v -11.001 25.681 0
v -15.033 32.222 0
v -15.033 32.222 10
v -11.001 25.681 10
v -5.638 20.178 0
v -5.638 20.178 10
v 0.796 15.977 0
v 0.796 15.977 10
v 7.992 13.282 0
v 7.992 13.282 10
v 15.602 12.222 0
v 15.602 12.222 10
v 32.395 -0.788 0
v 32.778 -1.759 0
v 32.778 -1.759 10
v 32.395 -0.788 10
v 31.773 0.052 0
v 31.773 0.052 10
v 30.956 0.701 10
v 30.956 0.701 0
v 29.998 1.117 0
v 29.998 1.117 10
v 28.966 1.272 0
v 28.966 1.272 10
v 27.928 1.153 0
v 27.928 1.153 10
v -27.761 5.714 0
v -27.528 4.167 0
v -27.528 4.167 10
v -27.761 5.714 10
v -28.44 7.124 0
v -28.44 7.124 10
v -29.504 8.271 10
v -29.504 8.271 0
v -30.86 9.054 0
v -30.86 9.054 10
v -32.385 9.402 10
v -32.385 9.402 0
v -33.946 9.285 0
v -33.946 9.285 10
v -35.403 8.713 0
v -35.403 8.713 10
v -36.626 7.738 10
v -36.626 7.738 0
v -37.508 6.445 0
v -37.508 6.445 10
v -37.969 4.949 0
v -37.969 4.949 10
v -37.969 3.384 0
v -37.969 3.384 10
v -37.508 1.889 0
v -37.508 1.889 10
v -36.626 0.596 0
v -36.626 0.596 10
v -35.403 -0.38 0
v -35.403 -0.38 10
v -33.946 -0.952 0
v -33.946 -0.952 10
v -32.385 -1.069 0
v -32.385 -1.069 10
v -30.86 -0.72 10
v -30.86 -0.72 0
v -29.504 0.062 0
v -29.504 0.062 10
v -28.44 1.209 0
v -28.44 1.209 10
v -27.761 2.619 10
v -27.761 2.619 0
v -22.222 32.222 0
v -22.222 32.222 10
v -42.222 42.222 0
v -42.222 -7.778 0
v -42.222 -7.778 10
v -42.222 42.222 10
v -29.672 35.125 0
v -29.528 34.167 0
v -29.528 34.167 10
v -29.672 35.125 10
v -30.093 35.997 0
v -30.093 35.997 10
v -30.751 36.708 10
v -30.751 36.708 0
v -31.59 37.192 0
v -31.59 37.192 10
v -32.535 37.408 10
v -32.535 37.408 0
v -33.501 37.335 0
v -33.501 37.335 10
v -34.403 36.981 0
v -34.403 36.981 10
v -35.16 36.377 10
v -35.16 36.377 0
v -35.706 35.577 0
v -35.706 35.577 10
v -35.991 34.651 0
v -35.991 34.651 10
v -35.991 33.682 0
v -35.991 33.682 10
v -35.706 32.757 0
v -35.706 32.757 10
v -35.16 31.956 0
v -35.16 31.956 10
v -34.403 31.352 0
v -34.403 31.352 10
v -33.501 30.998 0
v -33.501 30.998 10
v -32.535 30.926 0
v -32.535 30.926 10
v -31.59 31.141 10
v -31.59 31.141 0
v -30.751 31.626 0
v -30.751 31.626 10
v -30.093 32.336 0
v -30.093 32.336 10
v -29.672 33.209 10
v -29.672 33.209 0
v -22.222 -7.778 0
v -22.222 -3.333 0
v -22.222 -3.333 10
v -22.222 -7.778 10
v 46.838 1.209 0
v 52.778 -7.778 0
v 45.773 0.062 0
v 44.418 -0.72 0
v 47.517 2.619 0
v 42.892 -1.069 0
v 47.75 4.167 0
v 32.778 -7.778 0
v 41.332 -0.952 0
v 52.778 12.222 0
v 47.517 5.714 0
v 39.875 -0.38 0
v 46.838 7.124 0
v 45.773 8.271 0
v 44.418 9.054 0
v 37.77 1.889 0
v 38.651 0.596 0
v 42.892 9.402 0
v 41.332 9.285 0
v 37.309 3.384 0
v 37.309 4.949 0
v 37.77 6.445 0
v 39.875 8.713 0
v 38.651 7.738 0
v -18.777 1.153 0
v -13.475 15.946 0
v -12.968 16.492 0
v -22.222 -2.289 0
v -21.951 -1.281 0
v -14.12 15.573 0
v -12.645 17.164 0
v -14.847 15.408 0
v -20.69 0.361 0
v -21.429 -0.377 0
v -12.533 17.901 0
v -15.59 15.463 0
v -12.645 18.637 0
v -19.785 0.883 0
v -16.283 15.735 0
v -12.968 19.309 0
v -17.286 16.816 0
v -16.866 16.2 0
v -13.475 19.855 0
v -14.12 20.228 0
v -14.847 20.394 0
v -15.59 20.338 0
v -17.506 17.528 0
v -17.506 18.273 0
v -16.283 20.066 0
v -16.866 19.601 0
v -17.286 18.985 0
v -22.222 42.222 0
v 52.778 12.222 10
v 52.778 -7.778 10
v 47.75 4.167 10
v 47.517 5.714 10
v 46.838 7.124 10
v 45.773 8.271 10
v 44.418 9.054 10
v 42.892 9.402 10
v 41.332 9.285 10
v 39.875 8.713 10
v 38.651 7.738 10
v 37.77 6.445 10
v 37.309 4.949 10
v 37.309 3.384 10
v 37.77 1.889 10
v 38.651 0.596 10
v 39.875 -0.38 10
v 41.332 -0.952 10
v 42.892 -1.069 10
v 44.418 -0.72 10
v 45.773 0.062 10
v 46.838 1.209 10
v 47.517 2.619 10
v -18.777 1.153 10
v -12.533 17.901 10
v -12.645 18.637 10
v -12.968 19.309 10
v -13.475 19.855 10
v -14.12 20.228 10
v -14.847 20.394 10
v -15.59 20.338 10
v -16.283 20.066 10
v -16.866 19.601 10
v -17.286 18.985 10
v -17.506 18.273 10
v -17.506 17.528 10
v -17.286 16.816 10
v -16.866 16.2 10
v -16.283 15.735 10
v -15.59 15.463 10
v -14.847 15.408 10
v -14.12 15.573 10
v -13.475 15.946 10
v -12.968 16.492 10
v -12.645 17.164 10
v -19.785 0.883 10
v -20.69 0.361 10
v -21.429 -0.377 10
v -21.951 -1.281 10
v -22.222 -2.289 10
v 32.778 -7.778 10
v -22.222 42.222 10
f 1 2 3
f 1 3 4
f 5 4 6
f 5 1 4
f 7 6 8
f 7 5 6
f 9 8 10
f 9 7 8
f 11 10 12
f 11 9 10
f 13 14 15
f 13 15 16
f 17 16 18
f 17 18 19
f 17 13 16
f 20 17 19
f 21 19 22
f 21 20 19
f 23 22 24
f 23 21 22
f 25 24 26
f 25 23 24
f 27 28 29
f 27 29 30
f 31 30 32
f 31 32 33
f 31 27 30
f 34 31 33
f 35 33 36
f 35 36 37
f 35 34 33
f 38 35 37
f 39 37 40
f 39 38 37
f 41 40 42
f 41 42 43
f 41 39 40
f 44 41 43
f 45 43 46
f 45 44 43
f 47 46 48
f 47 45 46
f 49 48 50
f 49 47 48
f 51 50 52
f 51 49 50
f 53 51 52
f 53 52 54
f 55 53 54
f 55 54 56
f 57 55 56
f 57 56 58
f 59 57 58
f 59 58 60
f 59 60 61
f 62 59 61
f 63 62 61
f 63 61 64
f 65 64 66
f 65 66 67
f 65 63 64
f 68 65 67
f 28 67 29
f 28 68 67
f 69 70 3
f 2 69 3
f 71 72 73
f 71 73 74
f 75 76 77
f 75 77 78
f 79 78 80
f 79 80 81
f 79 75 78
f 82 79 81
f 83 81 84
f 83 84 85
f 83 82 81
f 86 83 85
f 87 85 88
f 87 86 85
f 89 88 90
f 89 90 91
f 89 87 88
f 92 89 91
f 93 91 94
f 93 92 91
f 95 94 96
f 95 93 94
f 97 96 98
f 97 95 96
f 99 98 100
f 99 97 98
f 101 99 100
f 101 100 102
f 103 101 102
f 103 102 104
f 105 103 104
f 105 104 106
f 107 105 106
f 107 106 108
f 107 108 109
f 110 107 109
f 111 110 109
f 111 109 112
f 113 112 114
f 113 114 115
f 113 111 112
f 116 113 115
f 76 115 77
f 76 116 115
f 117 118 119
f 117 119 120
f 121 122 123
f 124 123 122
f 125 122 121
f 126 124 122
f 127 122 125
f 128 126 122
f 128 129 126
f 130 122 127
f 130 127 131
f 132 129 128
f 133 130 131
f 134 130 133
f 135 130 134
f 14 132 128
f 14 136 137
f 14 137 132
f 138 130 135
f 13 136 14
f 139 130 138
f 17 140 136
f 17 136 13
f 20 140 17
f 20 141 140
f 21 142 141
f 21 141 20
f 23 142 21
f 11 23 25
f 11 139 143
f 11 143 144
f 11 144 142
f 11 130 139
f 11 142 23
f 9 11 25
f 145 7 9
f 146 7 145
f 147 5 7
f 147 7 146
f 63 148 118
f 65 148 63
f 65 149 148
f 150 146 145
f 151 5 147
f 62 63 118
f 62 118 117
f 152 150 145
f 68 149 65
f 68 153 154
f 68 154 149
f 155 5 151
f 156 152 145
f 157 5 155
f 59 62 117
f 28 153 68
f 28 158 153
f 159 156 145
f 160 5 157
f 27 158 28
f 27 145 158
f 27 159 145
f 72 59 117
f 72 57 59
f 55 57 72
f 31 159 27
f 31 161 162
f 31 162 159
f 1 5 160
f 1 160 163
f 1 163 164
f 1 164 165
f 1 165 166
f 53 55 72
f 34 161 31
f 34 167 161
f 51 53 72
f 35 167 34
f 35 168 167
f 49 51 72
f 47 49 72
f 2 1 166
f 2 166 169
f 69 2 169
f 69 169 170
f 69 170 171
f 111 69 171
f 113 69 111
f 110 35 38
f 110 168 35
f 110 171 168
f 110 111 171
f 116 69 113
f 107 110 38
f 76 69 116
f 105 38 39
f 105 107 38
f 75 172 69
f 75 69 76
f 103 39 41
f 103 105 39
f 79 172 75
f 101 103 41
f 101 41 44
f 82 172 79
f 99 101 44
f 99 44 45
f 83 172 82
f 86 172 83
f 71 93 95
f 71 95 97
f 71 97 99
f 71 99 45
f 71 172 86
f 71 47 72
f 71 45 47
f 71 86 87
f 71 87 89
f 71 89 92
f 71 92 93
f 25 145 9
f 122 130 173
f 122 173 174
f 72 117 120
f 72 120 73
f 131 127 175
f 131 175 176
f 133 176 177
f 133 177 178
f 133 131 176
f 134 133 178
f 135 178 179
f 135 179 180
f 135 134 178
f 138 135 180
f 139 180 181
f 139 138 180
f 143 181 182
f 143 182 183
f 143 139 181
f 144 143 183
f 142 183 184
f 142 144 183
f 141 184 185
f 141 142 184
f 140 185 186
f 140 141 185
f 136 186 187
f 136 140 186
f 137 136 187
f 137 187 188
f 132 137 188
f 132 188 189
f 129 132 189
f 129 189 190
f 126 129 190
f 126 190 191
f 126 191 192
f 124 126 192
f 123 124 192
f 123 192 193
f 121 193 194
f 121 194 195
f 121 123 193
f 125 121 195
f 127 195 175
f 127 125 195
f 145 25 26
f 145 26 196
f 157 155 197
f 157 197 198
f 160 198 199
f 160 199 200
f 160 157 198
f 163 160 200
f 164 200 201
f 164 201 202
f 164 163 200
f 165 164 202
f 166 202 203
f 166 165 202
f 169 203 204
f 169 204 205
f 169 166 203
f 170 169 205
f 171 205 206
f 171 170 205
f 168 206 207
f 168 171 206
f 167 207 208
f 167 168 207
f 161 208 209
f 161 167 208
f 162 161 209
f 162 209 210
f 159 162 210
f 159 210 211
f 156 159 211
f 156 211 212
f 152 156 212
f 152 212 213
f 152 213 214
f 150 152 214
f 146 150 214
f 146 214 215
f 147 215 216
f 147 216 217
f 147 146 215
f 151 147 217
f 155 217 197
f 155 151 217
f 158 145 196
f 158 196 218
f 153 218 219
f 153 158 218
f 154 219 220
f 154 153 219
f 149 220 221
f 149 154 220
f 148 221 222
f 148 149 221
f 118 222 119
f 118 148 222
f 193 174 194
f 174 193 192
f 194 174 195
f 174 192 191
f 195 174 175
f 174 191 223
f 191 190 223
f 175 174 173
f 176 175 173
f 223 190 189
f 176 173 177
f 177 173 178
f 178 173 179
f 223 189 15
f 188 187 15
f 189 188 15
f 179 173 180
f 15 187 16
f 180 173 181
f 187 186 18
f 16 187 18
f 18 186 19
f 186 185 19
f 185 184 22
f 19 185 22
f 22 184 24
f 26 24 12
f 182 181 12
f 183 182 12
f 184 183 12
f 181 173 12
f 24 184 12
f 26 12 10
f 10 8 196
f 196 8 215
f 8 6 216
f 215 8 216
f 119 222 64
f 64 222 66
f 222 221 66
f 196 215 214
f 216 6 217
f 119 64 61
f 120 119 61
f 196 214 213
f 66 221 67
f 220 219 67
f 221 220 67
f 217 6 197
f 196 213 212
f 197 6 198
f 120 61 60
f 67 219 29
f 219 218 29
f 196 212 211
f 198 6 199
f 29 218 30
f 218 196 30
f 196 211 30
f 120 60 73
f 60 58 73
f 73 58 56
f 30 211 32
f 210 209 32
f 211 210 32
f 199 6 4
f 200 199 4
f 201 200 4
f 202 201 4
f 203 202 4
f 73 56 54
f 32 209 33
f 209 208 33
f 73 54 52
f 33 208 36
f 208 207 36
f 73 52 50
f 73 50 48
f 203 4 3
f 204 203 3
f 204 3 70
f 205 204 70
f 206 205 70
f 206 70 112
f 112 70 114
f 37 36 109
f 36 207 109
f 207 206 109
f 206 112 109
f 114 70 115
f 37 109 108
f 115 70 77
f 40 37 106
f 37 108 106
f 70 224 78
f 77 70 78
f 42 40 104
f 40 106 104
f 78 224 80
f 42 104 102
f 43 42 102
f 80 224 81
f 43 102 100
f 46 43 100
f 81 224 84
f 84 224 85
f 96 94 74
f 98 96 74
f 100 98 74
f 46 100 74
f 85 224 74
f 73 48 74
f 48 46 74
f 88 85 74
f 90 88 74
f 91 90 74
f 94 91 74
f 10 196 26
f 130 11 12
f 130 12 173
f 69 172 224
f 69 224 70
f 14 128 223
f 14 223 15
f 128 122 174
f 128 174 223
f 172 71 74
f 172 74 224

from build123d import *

# Parameters (mm, degrees)
SKETCH1_R           = 3.25
SKETCH1_R_2         = 5.25
SKETCH1_R_3         = 2.5
BOSS_EXTRUDE1_DEPTH = 10


with BuildPart() as part:
    # Sketch1 → Boss-Extrude1 (new body)
    with BuildSketch(Plane.XY):
        with BuildLine():
            Line((-42.222222222, -7.777777778), (-42.222222222, 42.222222222))
            Line((-42.222222222, 42.222222222), (-22.222222222, 42.222222222))
            Line((-22.222222222, 42.222222222), (-22.222222222, 32.222222222))
            Line((-22.222222222, 32.222222222), (-15.033488385, 32.222222222))
            ThreePointArc((-15.033488385, 32.222222222), (-2.53685568, 17.900528045), (15.60242755, 12.222222222))
            Line((15.60242755, 12.222222222), (52.777777778, 12.222222222))
            Line((52.777777778, 12.222222222), (52.777777778, -7.777777778))
            Line((52.777777778, -7.777777778), (32.777777778, -7.777777778))
            Line((32.777777778, -7.777777778), (32.777777778, -1.759068459))
            ThreePointArc((32.777777778, -1.759068459), (30.956018506, 0.70137381), (27.928044759, 1.152990889))
            Line((27.928044759, 1.152990889), (-18.776515477, 1.152990889))
            ThreePointArc((-18.776515477, 1.152990889), (-21.428517019, -0.376541989), (-22.222222222, -3.333333333))
            Line((-22.222222222, -3.333333333), (-22.222222222, -7.777777778))
            Line((-22.222222222, -7.777777778), (-42.222222222, -7.777777778))
        make_face()
        with Locations((-32.777777778, 34.166666667)):
            Circle(SKETCH1_R, mode=Mode.SUBTRACT)
        with Locations((-32.777777778, 4.166666667)):
            Circle(SKETCH1_R_2, mode=Mode.SUBTRACT)
        with Locations((-15.033488385, 17.900528045)):
            Circle(SKETCH1_R_3, mode=Mode.SUBTRACT)
        with Locations((42.5, 4.166666667)):
            Circle(SKETCH1_R_2, mode=Mode.SUBTRACT)
    extrude(amount=BOSS_EXTRUDE1_DEPTH)


solid = part.part
